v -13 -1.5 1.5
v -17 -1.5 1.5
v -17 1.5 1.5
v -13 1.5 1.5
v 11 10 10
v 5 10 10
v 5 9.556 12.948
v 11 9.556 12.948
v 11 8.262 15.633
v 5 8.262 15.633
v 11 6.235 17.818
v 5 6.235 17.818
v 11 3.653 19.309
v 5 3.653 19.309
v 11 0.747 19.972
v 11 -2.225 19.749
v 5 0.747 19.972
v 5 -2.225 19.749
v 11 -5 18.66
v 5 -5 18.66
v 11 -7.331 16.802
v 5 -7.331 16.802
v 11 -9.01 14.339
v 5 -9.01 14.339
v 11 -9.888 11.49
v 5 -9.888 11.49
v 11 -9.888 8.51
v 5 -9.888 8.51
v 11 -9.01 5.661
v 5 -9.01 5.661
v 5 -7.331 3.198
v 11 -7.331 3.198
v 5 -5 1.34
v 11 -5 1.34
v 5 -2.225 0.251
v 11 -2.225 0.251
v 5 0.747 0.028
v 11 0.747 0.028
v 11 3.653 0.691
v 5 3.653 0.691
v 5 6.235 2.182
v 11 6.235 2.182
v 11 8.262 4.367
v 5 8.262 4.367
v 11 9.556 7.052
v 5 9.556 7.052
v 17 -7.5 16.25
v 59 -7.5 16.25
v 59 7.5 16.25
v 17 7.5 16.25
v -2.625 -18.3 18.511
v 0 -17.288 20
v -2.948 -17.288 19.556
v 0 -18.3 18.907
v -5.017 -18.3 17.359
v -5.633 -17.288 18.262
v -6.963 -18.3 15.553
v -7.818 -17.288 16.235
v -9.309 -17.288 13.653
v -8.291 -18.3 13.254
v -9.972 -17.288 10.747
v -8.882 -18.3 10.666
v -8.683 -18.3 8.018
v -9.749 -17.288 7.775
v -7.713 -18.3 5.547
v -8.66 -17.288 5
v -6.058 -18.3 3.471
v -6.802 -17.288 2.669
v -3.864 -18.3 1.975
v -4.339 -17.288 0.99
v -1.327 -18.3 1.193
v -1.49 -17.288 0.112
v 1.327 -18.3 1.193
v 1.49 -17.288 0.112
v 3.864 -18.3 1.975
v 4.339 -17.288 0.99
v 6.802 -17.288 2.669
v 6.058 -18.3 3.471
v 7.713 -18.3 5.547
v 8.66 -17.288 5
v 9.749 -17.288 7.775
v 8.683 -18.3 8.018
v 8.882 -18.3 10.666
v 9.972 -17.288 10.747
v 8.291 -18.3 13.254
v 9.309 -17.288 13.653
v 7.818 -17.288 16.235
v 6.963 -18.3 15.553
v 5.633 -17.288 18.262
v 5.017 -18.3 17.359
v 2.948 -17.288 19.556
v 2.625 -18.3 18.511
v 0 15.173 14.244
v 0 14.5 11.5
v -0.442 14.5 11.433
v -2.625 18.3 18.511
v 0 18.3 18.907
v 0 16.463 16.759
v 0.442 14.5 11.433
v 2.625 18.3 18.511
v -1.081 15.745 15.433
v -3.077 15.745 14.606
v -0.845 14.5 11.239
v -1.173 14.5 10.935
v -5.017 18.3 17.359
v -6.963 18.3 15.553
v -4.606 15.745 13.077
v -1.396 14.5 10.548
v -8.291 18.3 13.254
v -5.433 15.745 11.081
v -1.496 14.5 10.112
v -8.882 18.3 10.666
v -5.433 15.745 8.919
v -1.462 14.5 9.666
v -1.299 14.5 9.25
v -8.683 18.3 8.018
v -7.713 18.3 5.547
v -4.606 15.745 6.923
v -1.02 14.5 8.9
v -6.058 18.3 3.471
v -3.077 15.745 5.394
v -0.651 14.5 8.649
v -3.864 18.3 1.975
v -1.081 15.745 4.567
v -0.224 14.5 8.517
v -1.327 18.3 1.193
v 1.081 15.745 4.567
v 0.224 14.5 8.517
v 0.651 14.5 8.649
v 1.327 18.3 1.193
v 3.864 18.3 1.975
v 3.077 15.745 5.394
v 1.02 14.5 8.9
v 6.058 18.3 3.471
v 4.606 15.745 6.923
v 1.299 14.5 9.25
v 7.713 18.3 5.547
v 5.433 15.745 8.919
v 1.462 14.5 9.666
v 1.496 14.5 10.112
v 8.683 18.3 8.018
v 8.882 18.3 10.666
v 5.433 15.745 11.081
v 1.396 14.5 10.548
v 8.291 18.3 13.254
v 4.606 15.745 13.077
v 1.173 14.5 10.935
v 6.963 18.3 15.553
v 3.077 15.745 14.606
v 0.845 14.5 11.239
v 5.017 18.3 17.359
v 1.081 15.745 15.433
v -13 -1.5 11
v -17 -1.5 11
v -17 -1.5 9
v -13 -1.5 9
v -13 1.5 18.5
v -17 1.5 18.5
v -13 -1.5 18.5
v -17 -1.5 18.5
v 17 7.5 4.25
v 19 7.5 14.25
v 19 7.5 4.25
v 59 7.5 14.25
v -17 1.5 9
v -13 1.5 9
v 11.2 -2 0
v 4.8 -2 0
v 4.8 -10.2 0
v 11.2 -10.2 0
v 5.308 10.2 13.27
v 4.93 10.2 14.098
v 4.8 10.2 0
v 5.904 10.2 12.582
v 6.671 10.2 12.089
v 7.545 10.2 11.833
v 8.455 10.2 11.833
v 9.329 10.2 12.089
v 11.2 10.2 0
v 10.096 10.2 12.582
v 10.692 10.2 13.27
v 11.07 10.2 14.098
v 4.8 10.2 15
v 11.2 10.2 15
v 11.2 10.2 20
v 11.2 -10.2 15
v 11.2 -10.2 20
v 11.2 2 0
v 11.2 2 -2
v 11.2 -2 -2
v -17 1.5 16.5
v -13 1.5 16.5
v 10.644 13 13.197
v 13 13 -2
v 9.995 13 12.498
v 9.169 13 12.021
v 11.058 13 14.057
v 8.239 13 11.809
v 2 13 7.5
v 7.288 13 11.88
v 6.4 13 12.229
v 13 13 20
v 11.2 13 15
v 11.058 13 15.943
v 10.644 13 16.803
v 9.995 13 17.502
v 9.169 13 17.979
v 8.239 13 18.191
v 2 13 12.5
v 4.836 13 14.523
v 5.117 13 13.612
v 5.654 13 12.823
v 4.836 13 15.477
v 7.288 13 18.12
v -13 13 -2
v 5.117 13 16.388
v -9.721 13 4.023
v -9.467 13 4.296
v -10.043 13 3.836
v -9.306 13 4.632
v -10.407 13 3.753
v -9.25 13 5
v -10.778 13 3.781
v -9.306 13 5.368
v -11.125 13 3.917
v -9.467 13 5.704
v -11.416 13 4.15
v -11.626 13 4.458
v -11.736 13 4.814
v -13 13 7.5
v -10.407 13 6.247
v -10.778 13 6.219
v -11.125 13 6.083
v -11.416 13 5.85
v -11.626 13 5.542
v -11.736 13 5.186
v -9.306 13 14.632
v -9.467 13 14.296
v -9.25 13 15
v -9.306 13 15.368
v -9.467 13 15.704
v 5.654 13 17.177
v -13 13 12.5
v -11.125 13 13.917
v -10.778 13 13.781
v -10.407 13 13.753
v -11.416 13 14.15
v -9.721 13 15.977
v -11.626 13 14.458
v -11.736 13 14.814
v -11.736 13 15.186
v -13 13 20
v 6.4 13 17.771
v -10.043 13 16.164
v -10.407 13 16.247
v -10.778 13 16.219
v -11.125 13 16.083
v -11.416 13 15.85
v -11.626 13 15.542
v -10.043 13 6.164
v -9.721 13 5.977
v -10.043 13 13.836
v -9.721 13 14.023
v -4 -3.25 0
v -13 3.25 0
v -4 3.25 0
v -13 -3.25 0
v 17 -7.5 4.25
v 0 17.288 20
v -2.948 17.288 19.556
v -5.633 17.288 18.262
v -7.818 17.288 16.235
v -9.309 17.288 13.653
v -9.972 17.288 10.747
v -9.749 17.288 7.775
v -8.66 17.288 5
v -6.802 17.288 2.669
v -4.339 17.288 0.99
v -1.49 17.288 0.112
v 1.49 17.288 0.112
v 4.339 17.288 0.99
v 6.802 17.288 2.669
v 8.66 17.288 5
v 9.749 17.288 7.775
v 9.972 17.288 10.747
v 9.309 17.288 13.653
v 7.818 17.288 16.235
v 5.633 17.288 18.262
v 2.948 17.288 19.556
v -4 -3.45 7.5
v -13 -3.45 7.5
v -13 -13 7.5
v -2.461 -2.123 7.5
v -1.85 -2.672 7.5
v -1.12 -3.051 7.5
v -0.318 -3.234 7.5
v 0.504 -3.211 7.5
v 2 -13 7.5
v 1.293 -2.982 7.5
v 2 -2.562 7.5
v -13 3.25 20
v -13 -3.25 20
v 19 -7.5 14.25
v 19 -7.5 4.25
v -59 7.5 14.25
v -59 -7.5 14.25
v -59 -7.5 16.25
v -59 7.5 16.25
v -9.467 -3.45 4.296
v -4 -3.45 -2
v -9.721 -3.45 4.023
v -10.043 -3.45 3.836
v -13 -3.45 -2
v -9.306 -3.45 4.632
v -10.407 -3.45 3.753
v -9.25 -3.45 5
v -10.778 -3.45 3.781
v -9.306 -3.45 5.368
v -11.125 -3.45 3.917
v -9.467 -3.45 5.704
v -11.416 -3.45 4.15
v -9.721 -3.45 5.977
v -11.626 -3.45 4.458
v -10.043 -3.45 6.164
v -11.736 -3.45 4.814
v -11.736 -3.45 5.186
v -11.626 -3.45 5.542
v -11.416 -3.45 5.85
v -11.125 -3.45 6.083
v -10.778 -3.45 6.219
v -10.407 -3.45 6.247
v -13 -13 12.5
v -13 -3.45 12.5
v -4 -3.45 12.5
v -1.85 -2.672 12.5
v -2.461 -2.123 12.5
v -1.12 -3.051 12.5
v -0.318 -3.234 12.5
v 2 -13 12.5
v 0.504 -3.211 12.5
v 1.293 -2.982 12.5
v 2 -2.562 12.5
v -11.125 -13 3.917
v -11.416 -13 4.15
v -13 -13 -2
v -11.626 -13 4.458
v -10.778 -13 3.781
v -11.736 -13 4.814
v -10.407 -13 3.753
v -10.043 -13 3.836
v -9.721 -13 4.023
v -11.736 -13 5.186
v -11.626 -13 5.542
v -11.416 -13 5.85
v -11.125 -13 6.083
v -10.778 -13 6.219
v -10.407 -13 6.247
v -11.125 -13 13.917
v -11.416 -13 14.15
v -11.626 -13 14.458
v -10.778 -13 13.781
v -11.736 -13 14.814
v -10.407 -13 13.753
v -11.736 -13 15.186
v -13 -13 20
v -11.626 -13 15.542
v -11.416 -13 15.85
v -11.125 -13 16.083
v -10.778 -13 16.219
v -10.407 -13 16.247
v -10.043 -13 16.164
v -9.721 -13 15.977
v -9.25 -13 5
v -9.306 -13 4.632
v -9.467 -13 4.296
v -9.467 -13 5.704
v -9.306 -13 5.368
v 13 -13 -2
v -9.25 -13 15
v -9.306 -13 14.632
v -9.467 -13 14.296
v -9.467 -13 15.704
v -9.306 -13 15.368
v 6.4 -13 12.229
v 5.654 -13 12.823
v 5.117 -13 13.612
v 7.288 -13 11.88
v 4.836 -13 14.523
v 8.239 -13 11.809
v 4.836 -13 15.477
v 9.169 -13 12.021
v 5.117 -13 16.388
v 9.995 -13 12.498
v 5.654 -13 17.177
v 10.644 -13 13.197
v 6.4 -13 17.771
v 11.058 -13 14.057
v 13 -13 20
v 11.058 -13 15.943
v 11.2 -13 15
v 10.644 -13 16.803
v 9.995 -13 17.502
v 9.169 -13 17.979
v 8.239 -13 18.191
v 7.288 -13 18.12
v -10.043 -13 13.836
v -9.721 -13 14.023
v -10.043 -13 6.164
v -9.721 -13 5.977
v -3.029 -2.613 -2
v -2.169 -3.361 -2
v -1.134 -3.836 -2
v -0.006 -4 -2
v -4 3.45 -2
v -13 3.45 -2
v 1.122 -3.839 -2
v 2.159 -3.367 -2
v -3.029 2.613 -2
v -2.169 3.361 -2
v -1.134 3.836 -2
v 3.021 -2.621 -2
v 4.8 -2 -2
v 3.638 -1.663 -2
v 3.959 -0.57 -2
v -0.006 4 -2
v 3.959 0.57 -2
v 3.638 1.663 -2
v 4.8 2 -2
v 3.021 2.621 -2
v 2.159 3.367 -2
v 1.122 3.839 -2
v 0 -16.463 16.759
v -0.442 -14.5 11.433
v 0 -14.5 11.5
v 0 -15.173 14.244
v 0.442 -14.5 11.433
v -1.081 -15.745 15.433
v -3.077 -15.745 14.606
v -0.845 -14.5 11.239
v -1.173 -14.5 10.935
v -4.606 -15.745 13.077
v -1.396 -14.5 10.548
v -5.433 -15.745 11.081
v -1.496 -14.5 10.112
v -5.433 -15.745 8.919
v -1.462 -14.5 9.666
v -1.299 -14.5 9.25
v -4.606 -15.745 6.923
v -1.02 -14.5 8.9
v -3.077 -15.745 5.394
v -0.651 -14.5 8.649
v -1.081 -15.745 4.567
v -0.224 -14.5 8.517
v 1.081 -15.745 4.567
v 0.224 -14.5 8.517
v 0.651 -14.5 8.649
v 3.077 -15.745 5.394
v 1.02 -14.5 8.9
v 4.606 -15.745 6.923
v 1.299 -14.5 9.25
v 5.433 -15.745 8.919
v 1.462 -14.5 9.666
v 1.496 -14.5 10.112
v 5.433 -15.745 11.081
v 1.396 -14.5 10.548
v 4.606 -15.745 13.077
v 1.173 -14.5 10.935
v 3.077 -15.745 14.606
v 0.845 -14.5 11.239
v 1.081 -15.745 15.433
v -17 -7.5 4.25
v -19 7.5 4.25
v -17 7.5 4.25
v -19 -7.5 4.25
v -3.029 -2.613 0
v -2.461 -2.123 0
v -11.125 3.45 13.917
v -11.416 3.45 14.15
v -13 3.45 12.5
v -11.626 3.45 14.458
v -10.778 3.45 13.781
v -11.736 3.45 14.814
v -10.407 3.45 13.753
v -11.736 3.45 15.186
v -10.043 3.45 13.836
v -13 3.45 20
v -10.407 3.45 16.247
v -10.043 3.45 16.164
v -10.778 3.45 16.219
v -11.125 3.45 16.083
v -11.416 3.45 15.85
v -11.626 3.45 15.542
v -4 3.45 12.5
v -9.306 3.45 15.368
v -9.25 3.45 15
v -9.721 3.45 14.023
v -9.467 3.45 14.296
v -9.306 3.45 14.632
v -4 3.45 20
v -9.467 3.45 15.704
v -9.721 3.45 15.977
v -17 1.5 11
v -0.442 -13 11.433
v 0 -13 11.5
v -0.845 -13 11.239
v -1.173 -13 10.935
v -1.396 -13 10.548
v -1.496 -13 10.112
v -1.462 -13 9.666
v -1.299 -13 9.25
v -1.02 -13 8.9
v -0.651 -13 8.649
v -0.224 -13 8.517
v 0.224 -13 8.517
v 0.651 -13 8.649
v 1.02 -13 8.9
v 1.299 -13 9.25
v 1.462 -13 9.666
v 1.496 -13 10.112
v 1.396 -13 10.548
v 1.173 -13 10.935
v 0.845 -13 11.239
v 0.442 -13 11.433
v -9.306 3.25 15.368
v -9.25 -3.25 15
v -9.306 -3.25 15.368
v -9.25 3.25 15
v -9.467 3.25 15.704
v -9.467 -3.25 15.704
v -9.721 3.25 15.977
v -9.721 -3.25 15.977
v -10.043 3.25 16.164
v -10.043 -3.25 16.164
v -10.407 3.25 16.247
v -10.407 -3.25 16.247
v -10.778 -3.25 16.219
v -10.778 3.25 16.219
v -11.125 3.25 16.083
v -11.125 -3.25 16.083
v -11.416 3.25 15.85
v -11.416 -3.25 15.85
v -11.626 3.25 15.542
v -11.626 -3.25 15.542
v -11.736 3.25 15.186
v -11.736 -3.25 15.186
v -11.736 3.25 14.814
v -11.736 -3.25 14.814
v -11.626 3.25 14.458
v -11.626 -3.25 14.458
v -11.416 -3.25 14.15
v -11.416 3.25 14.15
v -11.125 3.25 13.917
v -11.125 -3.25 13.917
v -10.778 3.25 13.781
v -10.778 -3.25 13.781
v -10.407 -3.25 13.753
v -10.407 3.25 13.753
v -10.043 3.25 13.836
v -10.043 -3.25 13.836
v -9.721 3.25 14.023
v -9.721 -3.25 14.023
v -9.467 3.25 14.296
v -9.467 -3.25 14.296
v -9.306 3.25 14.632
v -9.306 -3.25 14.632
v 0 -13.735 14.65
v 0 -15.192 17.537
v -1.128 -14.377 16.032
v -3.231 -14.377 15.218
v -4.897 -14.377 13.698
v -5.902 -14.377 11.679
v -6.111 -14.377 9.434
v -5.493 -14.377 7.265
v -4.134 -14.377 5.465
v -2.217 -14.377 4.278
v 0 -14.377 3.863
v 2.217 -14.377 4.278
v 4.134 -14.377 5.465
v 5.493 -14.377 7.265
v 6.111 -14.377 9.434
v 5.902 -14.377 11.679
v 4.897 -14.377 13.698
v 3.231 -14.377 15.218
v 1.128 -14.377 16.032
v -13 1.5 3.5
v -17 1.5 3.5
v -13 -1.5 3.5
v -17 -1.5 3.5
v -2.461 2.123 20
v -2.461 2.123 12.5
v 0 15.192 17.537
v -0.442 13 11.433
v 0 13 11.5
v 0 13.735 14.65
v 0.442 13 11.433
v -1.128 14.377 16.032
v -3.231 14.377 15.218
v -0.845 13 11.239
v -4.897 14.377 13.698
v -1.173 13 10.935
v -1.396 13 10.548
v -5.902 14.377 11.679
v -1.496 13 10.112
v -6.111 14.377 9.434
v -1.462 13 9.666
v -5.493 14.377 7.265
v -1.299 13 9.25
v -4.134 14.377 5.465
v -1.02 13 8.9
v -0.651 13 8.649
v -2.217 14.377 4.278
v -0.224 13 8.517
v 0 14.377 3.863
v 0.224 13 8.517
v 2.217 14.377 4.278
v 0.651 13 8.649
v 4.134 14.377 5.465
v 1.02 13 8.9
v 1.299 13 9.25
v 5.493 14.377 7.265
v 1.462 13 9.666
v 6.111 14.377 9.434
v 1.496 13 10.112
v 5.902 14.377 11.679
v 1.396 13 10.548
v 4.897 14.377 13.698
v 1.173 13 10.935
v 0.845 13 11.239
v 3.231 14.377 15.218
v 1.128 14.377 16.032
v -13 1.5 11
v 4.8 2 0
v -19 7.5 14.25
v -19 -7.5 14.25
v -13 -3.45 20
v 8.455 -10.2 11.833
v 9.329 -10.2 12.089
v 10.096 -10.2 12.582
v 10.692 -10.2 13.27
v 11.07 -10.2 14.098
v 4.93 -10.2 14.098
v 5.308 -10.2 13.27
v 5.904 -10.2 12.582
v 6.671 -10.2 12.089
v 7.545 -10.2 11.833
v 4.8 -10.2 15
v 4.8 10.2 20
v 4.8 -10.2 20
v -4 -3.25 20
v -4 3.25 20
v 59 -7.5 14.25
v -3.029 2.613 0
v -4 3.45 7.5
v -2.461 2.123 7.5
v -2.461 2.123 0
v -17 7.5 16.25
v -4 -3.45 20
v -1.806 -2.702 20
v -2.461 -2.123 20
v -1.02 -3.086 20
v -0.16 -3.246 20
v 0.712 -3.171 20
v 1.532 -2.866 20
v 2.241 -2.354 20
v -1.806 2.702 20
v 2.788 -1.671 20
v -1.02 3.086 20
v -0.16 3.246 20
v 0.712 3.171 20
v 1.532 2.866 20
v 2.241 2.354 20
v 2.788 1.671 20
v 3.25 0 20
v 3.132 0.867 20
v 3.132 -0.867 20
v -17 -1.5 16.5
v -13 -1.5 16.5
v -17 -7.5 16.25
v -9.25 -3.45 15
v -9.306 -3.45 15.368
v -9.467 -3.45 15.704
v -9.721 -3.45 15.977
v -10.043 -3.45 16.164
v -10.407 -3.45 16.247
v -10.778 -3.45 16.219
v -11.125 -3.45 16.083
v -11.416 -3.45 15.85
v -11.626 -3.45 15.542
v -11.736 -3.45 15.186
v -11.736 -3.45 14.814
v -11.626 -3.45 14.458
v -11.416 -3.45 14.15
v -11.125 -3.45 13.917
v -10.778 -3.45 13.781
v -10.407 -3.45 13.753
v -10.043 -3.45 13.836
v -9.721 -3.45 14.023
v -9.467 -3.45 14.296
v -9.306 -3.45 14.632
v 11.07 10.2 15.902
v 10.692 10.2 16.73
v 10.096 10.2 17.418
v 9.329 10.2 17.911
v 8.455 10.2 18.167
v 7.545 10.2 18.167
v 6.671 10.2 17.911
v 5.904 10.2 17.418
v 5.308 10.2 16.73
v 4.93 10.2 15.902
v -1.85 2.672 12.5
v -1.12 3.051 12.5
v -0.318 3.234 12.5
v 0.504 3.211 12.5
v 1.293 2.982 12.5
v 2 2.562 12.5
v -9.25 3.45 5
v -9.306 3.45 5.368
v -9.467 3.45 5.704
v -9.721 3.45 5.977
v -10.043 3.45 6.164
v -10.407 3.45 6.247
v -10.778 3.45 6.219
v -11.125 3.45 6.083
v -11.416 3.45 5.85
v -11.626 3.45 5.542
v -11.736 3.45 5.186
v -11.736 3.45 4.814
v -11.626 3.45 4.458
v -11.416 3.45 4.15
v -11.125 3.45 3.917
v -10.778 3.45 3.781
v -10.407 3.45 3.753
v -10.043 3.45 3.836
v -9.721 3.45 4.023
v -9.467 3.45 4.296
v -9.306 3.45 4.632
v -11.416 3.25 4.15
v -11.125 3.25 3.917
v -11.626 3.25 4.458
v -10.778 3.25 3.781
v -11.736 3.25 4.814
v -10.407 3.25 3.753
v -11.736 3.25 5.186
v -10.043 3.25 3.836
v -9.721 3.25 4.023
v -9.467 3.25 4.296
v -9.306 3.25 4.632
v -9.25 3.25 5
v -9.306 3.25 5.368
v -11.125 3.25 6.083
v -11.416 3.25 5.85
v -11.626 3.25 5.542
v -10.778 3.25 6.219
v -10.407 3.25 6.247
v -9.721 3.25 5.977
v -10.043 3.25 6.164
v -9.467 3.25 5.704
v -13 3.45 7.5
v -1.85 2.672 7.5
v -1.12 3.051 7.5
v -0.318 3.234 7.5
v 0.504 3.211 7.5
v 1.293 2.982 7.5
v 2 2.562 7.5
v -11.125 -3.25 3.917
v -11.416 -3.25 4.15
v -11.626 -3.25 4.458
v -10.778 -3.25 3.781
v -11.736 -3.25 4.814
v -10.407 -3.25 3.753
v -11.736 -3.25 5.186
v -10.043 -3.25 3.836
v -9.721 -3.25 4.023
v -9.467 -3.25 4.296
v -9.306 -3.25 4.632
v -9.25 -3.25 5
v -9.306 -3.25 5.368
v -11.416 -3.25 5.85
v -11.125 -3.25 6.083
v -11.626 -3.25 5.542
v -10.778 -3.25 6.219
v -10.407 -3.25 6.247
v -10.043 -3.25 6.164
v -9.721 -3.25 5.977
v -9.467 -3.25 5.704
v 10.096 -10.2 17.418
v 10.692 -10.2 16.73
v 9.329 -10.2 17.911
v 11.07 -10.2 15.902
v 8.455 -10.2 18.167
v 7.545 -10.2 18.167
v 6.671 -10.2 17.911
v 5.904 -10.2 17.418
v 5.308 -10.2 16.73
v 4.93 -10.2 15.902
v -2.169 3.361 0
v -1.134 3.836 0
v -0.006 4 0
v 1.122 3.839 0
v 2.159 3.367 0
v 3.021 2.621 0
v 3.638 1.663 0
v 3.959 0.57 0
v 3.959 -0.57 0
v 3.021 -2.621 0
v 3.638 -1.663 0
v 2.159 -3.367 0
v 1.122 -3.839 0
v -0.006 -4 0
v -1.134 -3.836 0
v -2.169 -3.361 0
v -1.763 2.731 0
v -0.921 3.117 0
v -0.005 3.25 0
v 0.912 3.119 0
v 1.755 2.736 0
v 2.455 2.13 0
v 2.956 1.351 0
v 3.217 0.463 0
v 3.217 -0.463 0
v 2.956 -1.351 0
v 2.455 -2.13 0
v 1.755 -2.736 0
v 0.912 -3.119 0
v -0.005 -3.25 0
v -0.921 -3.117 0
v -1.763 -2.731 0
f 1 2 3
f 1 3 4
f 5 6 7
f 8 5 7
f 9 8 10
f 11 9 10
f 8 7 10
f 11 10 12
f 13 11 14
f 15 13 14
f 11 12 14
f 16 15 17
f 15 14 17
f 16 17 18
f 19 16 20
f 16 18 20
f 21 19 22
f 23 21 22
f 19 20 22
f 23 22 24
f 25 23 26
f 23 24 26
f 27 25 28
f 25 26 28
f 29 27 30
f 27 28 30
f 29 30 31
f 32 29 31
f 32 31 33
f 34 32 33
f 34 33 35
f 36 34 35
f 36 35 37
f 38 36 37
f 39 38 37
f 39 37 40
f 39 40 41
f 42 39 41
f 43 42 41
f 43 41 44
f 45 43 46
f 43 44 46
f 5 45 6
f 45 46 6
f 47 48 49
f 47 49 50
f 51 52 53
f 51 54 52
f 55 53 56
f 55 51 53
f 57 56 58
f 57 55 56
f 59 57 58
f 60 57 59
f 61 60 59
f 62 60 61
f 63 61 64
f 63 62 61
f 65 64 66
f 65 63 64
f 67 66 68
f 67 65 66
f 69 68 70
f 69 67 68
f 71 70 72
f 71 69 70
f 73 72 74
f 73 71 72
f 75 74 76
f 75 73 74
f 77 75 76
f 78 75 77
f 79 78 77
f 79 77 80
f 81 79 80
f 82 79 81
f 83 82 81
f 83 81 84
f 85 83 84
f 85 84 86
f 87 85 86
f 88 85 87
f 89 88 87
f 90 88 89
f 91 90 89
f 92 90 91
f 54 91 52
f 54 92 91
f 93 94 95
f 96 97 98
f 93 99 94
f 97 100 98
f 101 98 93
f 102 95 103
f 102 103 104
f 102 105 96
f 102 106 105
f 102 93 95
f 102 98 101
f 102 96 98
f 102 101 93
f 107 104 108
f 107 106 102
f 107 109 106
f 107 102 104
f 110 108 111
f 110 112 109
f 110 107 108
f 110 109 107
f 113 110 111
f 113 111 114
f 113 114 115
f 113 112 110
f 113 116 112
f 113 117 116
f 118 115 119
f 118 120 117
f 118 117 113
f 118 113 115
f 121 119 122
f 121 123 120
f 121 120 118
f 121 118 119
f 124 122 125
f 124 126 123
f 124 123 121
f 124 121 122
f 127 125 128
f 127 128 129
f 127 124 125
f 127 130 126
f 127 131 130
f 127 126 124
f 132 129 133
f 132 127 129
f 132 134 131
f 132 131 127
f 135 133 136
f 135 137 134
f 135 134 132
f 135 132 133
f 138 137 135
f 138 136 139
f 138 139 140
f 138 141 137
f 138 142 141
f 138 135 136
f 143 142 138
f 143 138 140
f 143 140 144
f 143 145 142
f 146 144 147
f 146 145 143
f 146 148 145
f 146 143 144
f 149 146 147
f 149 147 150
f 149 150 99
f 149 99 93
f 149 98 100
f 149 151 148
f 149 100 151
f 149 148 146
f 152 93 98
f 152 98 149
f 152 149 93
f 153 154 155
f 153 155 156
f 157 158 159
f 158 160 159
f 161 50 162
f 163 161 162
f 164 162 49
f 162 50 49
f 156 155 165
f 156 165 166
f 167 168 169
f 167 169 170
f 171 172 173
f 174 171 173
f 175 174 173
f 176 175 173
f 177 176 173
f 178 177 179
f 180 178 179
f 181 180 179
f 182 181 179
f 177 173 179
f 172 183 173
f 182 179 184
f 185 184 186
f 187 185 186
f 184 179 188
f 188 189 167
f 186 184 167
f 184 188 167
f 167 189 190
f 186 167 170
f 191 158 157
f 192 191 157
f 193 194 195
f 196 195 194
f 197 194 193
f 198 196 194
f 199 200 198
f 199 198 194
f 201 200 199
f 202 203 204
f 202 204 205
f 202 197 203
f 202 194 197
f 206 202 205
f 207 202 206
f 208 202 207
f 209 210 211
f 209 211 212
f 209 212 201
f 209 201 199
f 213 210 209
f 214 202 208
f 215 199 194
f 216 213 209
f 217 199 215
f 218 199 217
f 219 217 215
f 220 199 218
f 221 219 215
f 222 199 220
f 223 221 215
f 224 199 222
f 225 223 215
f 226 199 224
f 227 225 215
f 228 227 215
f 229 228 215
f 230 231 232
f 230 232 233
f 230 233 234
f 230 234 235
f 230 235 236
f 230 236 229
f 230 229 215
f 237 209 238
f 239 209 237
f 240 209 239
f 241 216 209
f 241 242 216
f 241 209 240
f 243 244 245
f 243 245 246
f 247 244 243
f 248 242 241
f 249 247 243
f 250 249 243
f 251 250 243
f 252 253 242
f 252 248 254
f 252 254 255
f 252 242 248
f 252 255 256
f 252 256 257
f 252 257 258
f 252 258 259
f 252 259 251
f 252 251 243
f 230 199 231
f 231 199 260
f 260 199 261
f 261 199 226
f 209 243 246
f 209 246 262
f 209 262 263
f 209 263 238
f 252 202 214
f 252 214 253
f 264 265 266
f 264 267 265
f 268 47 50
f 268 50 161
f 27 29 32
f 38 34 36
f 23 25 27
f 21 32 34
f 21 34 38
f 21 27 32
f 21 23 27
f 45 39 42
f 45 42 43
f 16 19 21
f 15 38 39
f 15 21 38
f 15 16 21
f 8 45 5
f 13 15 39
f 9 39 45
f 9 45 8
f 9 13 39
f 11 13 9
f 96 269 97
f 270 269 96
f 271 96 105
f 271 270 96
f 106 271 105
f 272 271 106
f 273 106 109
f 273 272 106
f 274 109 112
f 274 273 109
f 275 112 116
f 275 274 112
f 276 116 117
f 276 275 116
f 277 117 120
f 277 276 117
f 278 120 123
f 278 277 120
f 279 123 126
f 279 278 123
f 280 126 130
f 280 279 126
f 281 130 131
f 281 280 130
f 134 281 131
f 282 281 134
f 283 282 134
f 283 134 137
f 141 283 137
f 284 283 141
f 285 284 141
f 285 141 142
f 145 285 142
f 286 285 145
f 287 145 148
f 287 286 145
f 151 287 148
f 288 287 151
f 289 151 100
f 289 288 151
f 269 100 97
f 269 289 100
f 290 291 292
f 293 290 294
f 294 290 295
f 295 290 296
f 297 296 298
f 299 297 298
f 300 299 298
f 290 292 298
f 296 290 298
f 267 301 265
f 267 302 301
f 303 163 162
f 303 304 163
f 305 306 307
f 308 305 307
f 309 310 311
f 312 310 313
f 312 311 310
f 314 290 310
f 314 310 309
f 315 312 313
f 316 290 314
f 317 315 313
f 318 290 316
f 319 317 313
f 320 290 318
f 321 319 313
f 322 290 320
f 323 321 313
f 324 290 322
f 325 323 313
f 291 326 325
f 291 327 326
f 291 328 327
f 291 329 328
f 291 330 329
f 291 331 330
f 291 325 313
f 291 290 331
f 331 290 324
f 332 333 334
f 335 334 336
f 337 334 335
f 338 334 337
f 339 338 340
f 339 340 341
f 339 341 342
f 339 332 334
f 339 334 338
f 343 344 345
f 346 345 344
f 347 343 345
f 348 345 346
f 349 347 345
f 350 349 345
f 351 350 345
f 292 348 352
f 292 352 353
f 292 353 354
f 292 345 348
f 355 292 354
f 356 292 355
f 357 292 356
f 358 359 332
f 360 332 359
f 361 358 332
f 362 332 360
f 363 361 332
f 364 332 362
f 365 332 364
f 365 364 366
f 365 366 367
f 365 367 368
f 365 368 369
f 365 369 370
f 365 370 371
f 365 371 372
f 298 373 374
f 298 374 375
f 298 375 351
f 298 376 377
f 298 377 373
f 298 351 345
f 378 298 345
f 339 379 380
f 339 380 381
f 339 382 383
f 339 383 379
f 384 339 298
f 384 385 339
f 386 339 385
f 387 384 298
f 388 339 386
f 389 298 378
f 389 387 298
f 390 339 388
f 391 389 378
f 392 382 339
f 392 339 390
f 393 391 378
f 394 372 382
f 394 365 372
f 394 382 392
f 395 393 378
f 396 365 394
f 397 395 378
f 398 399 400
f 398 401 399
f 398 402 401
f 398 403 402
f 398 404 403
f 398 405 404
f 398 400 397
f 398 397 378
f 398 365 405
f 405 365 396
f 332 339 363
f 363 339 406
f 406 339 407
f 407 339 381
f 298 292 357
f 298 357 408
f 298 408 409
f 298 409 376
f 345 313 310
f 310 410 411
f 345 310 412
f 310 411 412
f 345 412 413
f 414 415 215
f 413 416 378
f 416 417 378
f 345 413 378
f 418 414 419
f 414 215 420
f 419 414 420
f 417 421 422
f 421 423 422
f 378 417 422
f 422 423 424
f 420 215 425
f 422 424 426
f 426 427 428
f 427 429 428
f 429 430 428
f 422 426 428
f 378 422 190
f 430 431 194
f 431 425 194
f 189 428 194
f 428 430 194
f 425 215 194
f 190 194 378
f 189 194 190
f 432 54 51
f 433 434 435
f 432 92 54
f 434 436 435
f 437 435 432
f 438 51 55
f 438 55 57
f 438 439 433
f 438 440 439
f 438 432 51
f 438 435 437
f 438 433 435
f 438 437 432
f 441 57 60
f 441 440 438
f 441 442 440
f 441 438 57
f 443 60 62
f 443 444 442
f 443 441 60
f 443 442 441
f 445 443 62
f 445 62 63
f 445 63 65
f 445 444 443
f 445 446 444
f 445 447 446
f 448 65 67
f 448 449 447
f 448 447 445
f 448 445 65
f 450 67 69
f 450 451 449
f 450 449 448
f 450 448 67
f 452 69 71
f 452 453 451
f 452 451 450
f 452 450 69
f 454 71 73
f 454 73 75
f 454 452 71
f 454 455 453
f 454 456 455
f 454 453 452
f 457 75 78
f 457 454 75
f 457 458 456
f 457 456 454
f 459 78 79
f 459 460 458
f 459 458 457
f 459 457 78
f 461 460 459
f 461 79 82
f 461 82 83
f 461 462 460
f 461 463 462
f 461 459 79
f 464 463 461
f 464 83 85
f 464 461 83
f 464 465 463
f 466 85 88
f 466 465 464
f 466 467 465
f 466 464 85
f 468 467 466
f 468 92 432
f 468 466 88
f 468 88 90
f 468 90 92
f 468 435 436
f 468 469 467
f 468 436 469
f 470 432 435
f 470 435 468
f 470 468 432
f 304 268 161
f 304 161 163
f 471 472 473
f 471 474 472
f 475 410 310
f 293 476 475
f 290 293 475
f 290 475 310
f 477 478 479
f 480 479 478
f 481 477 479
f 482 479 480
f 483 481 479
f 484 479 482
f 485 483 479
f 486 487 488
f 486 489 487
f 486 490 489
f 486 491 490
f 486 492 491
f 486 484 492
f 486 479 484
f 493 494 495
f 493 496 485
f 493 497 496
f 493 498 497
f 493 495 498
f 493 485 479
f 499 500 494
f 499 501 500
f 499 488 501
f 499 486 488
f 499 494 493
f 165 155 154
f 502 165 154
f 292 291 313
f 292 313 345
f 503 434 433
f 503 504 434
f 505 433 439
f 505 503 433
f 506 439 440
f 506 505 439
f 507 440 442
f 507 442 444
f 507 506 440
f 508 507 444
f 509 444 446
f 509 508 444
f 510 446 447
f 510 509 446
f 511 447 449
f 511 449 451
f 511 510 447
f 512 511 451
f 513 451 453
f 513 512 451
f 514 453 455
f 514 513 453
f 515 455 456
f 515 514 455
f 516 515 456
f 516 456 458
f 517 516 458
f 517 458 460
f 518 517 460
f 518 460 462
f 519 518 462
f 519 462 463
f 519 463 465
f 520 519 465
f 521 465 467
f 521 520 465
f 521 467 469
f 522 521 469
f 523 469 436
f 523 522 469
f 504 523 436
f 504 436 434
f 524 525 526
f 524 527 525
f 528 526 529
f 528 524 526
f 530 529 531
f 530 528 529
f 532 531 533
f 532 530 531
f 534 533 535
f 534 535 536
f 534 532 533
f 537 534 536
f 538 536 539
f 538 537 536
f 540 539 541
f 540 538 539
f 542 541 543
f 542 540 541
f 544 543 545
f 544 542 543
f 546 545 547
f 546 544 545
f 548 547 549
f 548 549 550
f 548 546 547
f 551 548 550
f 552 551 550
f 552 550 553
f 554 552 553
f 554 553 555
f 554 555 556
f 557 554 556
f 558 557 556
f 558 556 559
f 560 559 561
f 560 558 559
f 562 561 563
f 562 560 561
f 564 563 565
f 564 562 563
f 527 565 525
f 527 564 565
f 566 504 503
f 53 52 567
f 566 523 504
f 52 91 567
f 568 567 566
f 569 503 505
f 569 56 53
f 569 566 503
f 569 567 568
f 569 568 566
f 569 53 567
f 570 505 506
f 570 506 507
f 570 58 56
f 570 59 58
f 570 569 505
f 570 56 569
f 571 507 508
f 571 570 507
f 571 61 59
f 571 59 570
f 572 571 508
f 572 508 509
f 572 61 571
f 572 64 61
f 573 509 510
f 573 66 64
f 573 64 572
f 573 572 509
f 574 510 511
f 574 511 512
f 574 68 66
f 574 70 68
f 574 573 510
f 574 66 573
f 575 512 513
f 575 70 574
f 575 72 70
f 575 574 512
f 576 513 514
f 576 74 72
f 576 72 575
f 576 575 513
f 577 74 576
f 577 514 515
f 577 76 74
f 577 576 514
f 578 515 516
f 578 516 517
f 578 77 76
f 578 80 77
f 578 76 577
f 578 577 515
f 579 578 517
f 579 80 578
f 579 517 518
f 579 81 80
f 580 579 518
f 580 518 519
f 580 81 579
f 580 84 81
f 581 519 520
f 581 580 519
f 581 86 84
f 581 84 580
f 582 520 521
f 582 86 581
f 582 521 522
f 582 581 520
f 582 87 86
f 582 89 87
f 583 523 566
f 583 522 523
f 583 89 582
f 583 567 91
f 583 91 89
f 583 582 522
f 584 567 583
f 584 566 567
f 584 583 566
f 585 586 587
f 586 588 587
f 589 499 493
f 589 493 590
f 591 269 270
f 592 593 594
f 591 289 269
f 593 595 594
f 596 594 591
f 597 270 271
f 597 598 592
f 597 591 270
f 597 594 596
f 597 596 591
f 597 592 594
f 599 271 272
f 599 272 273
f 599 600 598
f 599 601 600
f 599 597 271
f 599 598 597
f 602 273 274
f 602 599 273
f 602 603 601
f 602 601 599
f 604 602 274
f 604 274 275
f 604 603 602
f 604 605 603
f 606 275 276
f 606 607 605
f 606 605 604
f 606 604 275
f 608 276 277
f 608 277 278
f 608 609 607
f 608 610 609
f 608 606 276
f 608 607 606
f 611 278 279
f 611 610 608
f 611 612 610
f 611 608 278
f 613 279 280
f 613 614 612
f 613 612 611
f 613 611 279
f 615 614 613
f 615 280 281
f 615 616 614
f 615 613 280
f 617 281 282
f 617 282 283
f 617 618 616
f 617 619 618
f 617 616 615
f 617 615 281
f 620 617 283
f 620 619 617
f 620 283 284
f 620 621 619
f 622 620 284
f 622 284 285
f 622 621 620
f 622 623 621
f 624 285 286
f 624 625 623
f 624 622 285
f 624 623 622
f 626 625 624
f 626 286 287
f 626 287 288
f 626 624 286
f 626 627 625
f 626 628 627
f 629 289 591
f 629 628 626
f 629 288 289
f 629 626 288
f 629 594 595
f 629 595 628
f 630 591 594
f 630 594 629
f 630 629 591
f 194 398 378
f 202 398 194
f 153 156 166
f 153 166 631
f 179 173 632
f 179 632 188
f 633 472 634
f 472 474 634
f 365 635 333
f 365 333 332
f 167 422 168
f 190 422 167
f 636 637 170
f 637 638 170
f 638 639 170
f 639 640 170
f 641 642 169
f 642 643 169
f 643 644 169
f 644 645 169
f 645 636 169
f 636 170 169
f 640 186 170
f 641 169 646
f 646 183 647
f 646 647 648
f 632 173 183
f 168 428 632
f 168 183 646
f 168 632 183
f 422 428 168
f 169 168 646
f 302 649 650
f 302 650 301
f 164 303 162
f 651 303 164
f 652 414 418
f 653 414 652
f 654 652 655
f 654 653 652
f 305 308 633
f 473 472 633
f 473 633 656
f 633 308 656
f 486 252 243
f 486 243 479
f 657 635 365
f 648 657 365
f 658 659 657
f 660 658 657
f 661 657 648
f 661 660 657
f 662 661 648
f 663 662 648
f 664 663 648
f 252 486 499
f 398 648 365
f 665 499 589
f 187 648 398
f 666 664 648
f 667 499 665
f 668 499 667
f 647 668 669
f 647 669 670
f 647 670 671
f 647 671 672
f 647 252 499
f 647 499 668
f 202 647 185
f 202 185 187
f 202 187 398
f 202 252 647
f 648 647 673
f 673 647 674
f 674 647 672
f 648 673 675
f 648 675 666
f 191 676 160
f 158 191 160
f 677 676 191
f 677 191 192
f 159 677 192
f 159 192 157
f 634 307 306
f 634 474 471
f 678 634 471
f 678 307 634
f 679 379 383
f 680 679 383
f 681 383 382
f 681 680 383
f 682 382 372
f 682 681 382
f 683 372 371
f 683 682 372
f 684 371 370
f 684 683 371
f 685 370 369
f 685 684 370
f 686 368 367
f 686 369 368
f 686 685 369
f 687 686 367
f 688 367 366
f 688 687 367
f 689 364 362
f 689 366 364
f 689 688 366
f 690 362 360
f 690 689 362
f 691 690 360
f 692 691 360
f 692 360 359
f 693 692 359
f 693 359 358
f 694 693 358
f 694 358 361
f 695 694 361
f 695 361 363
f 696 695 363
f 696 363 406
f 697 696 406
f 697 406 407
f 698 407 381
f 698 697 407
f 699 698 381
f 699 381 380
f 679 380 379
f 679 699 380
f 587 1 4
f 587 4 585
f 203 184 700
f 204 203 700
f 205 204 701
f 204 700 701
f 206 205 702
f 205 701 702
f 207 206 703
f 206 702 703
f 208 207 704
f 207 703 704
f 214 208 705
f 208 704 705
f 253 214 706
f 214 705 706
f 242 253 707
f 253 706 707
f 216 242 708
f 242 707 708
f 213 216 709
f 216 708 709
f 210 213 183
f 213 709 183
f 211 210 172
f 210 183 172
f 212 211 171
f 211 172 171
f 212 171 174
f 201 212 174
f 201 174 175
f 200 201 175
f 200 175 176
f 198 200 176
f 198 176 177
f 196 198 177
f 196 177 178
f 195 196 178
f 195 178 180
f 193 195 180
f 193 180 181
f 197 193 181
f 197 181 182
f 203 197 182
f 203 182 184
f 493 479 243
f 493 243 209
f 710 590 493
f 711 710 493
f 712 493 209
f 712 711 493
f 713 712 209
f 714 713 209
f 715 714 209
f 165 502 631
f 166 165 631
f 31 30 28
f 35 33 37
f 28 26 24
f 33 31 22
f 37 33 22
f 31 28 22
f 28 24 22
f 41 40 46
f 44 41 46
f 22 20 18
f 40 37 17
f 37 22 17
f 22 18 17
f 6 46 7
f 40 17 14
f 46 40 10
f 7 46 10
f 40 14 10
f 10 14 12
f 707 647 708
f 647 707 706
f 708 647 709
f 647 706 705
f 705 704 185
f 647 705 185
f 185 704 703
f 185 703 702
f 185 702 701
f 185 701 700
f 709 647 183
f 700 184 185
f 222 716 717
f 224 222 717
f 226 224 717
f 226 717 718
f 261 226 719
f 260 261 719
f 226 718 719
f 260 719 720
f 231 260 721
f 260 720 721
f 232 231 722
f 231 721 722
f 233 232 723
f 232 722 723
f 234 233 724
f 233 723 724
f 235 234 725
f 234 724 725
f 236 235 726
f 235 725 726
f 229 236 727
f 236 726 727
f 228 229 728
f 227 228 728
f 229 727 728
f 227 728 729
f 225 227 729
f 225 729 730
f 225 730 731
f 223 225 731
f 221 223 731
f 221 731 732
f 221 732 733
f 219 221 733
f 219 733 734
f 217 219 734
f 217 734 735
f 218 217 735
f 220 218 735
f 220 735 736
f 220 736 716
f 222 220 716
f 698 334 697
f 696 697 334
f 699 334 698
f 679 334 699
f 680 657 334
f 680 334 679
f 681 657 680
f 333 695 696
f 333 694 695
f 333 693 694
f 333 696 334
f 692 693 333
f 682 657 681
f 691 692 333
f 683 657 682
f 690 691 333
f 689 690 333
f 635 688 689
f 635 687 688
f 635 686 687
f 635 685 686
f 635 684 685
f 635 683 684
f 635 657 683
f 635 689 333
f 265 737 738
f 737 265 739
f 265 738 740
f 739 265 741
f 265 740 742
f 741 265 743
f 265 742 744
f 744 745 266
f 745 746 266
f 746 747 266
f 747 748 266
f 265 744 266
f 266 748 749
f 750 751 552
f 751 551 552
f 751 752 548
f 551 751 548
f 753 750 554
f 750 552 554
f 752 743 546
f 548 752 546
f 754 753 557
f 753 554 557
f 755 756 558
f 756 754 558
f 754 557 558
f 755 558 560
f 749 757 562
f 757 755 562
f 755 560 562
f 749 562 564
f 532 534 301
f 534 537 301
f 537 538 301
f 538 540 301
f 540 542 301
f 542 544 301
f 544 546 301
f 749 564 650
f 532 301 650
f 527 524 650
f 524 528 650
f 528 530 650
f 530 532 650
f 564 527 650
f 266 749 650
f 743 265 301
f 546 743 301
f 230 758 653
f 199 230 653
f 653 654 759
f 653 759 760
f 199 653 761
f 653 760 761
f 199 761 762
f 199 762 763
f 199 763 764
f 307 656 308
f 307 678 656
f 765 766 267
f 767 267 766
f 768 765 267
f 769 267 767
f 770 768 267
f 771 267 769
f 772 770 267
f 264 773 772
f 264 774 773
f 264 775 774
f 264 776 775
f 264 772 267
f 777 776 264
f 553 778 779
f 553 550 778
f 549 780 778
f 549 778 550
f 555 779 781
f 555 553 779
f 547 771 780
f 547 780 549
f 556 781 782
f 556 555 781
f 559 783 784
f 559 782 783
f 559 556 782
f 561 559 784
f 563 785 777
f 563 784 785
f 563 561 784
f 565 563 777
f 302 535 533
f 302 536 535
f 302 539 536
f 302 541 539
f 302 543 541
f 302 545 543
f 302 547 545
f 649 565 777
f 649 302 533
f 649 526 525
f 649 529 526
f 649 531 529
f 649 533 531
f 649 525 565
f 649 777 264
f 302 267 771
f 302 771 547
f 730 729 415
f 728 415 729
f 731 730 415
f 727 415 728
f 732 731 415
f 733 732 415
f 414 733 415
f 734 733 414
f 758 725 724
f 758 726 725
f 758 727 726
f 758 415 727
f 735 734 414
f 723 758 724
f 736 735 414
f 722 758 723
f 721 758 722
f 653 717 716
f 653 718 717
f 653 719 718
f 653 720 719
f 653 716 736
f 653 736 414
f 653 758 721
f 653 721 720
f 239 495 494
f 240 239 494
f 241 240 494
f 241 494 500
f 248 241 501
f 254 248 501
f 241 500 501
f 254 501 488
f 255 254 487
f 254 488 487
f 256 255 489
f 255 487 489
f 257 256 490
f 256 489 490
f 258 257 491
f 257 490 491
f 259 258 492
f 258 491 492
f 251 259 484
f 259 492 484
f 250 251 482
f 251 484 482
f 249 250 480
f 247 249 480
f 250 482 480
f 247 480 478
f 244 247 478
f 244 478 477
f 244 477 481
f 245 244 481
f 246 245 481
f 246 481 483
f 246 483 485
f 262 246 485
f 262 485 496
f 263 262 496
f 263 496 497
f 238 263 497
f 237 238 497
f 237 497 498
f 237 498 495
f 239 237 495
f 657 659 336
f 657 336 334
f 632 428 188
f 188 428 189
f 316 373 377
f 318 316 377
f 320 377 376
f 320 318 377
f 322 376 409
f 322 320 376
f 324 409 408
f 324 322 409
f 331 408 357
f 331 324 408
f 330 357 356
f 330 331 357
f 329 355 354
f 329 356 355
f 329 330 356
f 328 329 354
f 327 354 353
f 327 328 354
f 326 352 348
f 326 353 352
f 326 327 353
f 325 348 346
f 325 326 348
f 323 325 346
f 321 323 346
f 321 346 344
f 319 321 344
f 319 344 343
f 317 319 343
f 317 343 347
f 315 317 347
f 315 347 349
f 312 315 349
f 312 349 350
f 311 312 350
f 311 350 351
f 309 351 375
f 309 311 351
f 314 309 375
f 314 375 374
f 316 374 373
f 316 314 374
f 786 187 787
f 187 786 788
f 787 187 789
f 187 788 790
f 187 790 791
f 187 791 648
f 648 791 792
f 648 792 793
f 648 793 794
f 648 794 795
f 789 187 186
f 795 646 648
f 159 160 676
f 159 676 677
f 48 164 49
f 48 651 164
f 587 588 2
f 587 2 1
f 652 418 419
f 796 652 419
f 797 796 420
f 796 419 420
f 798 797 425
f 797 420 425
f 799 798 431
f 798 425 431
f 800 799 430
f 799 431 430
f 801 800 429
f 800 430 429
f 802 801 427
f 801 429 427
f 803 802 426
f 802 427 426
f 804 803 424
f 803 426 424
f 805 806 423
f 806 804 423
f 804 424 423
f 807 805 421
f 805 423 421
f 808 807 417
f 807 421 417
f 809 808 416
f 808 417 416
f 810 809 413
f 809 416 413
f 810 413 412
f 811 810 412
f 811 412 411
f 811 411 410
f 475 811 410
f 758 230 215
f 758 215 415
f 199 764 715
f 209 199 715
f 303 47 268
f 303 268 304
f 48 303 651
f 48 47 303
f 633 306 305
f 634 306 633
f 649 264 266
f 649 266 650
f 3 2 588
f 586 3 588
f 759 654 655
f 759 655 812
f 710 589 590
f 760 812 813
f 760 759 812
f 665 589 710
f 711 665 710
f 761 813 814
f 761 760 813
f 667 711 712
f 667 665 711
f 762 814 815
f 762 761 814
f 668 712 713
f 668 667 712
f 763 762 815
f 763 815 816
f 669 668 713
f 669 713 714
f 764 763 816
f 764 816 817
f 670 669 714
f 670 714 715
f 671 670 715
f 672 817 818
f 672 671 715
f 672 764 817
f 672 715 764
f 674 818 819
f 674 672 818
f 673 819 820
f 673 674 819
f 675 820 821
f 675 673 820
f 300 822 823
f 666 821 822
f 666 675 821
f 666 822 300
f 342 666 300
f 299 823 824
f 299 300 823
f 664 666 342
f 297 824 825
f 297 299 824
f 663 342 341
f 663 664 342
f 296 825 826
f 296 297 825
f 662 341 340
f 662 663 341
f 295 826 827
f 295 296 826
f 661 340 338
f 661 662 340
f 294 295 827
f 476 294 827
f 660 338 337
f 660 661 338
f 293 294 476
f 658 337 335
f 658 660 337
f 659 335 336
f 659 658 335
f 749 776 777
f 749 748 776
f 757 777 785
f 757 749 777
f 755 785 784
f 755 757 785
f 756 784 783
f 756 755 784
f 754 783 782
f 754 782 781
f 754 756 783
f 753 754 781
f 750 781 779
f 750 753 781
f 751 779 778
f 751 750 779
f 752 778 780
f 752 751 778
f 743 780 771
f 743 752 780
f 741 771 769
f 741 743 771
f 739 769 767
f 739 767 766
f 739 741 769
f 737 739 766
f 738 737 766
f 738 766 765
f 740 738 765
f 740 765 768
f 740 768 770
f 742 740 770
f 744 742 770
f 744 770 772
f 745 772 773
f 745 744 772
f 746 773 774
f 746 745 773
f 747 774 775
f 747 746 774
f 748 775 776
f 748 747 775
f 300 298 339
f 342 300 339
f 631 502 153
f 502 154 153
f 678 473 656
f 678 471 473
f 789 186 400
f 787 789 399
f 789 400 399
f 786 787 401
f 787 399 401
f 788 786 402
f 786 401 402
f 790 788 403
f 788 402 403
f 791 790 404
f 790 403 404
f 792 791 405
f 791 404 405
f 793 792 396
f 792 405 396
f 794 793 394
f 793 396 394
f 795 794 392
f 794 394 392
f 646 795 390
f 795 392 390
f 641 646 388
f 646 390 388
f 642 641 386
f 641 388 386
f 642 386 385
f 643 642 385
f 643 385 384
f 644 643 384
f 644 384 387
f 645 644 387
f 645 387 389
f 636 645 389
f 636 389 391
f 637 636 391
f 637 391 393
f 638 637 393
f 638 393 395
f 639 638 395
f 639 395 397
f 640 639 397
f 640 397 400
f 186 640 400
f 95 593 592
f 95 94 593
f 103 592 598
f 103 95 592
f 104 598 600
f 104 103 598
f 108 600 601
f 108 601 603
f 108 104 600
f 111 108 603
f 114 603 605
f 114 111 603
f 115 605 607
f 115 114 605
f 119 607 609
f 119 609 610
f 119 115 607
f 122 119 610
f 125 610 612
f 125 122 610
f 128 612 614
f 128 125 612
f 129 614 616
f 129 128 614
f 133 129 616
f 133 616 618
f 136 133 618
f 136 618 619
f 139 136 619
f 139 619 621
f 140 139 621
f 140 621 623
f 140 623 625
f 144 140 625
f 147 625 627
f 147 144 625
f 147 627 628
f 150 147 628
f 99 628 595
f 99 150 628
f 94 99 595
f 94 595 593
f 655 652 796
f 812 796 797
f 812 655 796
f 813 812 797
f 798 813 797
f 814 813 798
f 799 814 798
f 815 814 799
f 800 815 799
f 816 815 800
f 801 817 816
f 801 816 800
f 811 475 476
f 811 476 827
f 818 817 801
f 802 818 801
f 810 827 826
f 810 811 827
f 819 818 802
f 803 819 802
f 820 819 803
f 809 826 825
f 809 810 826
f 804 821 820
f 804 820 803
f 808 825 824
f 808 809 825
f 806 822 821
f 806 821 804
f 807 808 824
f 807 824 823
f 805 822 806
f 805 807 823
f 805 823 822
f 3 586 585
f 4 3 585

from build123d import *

# Parameters (mm, degrees)
F1_R          = 1.25
F2_DEPTH      = 3.25
F1_W          = 4
F1_H          = 2
F3_DEPTH      = 1.5
F5_START      = 5
F4_R          = 10
F5_DEPTH      = 6
F7_DEPTH      = 20
F8_DEPTH      = 2
F9_DEPTH      = 13.001
F9_DEPTH_BACK = 13.001
F10_W         = 15
F10_H         = 5
F10_R         = 3.2
F11_DEPTH     = 26.001
F12_R         = 4
F13_DEPTH     = 2
F16_W         = 2
F16_H         = 2
F16_W_2       = 40
F16_H_2       = 10
F17_DEPTH     = 7.5
F18_W         = 6.4
F18_H         = 4
F19_DEPTH     = 2


with BuildPart() as f2:
    # F1 (on Front) → F2 (new body, symmetric)
    with BuildSketch(Plane.XZ):
        Polygon((-13, 0), (-4, 0), (-4, 20), (-13, 20), (-13, 18.5), (-13, 16.5), (-13, 11), (-13, 9), (-13, 3.5), (-13, 1.5), align=None)
        with Locations((-10.5, 5)):
            Circle(F1_R, mode=Mode.SUBTRACT)
        with Locations((-10.5, 15)):
            Circle(F1_R, mode=Mode.SUBTRACT)
    extrude(amount=F2_DEPTH, both=True)


with BuildPart() as f3:
    # F1 (on Front) → F3 (new body, symmetric)
    with BuildSketch(Plane.XZ):
        with Locations((-15, 17.5)):
            Rectangle(F1_W, F1_H)
    extrude(amount=F3_DEPTH, both=True)


with BuildPart() as f3b:
    # F1 (on Front) → F3, piece 2 (new body, symmetric)
    with BuildSketch(Plane.XZ):
        with Locations((-15, 10)):
            Rectangle(F1_W, F1_H)
    extrude(amount=F3_DEPTH, both=True)


with BuildPart() as f3c:
    # F1 (on Front) → F3, piece 3 (new body, symmetric)
    with BuildSketch(Plane.XZ):
        with Locations((-15, 2.5)):
            Rectangle(F1_W, F1_H)
    extrude(amount=F3_DEPTH, both=True)


with BuildPart() as f5:
    # F4 (on Right) → F5 (new body)
    with BuildSketch(Plane.YZ.offset(F5_START)):
        with Locations((0, 10)):
            Circle(F4_R)
    extrude(amount=F5_DEPTH)


with BuildPart() as f7:
    # F6 (on Top) → F7 (new body, through all)
    with BuildSketch(Plane.XY):
        with BuildLine():
            Line((-13, 13), (-13, 3.45))
            Line((-13, 3.45), (-4, 3.45))
            Line((-4, 3.45), (-2.4610576884, 2.1226622563))
            ThreePointArc((-2.4610576884, 2.1226622563), (1.132268191, 3.0463861777), (3.25, 0))
            ThreePointArc((3.25, 0), (1.132268191, -3.0463861777), (-2.4610576884, -2.1226622563))
            Line((-2.4610576884, -2.1226622563), (-4, -3.45))
            Line((-4, -3.45), (-13, -3.45))
            Line((-13, -3.45), (-13, -13))
            Line((-13, -13), (13, -13))
            Line((13, -13), (13, 0))
            Line((13, 0), (13, 13))
            Line((13, 13), (-13, 13))
        make_face()
        Polygon((11.2, 10.2), (11.2, 0), (11.2, -10.2), (4.8, -10.2), (4.8, 0), (4.8, 10.2), align=None, mode=Mode.SUBTRACT)
    extrude(amount=F7_DEPTH)

    # F6 (on Top) → F8 (join)
    with BuildSketch(Plane.XY):
        with BuildLine():
            Line((-13, 13), (-13, 3.45))
            Line((-13, 3.45), (-4, 3.45))
            Line((-4, 3.45), (-2.4610576884, 2.1226622563))
            ThreePointArc((-2.4610576884, 2.1226622563), (1.132268191, 3.0463861777), (3.25, 0))
            ThreePointArc((3.25, 0), (1.132268191, -3.0463861777), (-2.4610576884, -2.1226622563))
            Line((-2.4610576884, -2.1226622563), (-4, -3.45))
            Line((-4, -3.45), (-13, -3.45))
            Line((-13, -3.45), (-13, -13))
            Line((-13, -13), (13, -13))
            Line((13, -13), (13, 0))
            Line((13, 0), (13, 13))
            Line((13, 13), (-13, 13))
        make_face()
        Polygon((11.2, 10.2), (11.2, 0), (11.2, -10.2), (4.8, -10.2), (4.8, 0), (4.8, 10.2), align=None, mode=Mode.SUBTRACT)
        Polygon((11.2, -10.2), (11.2, 0), (11.2, 10.2), (4.8, 10.2), (4.8, 0), (4.8, -10.2), align=None)
    extrude(amount=-F8_DEPTH)

    # F1 (on Front) → F9 (cut, two sides)
    with BuildSketch(Plane.XZ) as f9_sk:
        with Locations((-10.5, 15)):
            Circle(F1_R)
        with Locations((-10.5, 5)):
            Circle(F1_R)
    extrude(amount=-F9_DEPTH, mode=Mode.SUBTRACT)
    extrude(f9_sk.sketch, amount=F9_DEPTH_BACK, mode=Mode.SUBTRACT)

    # F10 (on face) → F11 (cut, through all)
    with BuildSketch(Plane.XZ.offset(13)):
        with Locations((-5.5, 10)):
            Rectangle(F10_W, F10_H)
        with Locations((8, 15)):
            Circle(F10_R)
    extrude(amount=-F11_DEPTH, mode=Mode.SUBTRACT)

    # F12 (on face) → F13 (cut)
    with BuildSketch(Plane(origin=(0, 0, -2), x_dir=(1, 0, 0), z_dir=(0, 0, -1))):
        Circle(F12_R)
    extrude(amount=-F13_DEPTH, mode=Mode.SUBTRACT)

    # F18 (on face) → F19 (cut, through all)
    with BuildSketch(Plane(origin=(0, 0, -2), x_dir=(1, 0, 0), z_dir=(0, 0, -1))):
        with Locations((8, 0)):
            Rectangle(F18_W, F18_H)
    extrude(amount=-F19_DEPTH, mode=Mode.SUBTRACT)


with BuildPart() as f15:
    # F14 (on Right) → F15 (revolve)
    with BuildSketch(Plane.YZ):
        with BuildLine():
            Line((-14.5, 11.5000000001), (-13, 11.5000000001))
            ThreePointArc((-13, 11.5000000001), (-14.3774914786, 16.136744585), (-17.2881856771, 20))
            Line((-17.2881856771, 20), (-18.3, 18.9065605671))
            ThreePointArc((-18.3, 18.9065605671), (-15.7450162133, 15.539325384), (-14.5, 11.5000000001))
        make_face()
    revolve(axis=Axis((0, -13.2708434956, 10.0000000001), (0, -1, 0)))


with BuildPart() as f15b:
    # F14 (on Right) → F15, piece 2 (revolve)
    with BuildSketch(Plane.YZ):
        with BuildLine():
            ThreePointArc((17.2881856771, 20), (14.3774914786, 16.136744585), (13, 11.5000000001))
            Line((13, 11.5000000001), (14.5, 11.5000000001))
            ThreePointArc((14.5, 11.5000000001), (15.7450162133, 15.539325384), (18.3, 18.9065605671))
            Line((18.3, 18.9065605671), (17.2881856771, 20))
        make_face()
    revolve(axis=Axis((0, -13.2708434956, 10.0000000001), (0, -1, 0)))


with BuildPart() as f17:
    # F16 (on Front) → F17 (new body, symmetric)
    with BuildSketch(Plane.XZ):
        with Locations((-18, 15.2500000002)):
            Rectangle(F16_W, F16_H)
        with Locations((-39, 15.2500000002)):
            Rectangle(F16_W_2, F16_H)
        with Locations((-18, 9.2500000002)):
            Rectangle(F16_W, F16_H_2)
    extrude(amount=F17_DEPTH, both=True)


with BuildPart() as f17b:
    # F16 (on Front) → F17, piece 2 (new body, symmetric)
    with BuildSketch(Plane.XZ):
        with Locations((39, 15.2500000002)):
            Rectangle(F16_W_2, F16_H)
        with Locations((18, 15.2500000002)):
            Rectangle(F16_W, F16_H)
        with Locations((18, 9.2500000002)):
            Rectangle(F16_W, F16_H_2)
    extrude(amount=F17_DEPTH, both=True)


solid = Compound([f2.part, f3.part, f3b.part, f3c.part, f5.part, f7.part, f15.part, f15b.part, f17.part, f17b.part])
